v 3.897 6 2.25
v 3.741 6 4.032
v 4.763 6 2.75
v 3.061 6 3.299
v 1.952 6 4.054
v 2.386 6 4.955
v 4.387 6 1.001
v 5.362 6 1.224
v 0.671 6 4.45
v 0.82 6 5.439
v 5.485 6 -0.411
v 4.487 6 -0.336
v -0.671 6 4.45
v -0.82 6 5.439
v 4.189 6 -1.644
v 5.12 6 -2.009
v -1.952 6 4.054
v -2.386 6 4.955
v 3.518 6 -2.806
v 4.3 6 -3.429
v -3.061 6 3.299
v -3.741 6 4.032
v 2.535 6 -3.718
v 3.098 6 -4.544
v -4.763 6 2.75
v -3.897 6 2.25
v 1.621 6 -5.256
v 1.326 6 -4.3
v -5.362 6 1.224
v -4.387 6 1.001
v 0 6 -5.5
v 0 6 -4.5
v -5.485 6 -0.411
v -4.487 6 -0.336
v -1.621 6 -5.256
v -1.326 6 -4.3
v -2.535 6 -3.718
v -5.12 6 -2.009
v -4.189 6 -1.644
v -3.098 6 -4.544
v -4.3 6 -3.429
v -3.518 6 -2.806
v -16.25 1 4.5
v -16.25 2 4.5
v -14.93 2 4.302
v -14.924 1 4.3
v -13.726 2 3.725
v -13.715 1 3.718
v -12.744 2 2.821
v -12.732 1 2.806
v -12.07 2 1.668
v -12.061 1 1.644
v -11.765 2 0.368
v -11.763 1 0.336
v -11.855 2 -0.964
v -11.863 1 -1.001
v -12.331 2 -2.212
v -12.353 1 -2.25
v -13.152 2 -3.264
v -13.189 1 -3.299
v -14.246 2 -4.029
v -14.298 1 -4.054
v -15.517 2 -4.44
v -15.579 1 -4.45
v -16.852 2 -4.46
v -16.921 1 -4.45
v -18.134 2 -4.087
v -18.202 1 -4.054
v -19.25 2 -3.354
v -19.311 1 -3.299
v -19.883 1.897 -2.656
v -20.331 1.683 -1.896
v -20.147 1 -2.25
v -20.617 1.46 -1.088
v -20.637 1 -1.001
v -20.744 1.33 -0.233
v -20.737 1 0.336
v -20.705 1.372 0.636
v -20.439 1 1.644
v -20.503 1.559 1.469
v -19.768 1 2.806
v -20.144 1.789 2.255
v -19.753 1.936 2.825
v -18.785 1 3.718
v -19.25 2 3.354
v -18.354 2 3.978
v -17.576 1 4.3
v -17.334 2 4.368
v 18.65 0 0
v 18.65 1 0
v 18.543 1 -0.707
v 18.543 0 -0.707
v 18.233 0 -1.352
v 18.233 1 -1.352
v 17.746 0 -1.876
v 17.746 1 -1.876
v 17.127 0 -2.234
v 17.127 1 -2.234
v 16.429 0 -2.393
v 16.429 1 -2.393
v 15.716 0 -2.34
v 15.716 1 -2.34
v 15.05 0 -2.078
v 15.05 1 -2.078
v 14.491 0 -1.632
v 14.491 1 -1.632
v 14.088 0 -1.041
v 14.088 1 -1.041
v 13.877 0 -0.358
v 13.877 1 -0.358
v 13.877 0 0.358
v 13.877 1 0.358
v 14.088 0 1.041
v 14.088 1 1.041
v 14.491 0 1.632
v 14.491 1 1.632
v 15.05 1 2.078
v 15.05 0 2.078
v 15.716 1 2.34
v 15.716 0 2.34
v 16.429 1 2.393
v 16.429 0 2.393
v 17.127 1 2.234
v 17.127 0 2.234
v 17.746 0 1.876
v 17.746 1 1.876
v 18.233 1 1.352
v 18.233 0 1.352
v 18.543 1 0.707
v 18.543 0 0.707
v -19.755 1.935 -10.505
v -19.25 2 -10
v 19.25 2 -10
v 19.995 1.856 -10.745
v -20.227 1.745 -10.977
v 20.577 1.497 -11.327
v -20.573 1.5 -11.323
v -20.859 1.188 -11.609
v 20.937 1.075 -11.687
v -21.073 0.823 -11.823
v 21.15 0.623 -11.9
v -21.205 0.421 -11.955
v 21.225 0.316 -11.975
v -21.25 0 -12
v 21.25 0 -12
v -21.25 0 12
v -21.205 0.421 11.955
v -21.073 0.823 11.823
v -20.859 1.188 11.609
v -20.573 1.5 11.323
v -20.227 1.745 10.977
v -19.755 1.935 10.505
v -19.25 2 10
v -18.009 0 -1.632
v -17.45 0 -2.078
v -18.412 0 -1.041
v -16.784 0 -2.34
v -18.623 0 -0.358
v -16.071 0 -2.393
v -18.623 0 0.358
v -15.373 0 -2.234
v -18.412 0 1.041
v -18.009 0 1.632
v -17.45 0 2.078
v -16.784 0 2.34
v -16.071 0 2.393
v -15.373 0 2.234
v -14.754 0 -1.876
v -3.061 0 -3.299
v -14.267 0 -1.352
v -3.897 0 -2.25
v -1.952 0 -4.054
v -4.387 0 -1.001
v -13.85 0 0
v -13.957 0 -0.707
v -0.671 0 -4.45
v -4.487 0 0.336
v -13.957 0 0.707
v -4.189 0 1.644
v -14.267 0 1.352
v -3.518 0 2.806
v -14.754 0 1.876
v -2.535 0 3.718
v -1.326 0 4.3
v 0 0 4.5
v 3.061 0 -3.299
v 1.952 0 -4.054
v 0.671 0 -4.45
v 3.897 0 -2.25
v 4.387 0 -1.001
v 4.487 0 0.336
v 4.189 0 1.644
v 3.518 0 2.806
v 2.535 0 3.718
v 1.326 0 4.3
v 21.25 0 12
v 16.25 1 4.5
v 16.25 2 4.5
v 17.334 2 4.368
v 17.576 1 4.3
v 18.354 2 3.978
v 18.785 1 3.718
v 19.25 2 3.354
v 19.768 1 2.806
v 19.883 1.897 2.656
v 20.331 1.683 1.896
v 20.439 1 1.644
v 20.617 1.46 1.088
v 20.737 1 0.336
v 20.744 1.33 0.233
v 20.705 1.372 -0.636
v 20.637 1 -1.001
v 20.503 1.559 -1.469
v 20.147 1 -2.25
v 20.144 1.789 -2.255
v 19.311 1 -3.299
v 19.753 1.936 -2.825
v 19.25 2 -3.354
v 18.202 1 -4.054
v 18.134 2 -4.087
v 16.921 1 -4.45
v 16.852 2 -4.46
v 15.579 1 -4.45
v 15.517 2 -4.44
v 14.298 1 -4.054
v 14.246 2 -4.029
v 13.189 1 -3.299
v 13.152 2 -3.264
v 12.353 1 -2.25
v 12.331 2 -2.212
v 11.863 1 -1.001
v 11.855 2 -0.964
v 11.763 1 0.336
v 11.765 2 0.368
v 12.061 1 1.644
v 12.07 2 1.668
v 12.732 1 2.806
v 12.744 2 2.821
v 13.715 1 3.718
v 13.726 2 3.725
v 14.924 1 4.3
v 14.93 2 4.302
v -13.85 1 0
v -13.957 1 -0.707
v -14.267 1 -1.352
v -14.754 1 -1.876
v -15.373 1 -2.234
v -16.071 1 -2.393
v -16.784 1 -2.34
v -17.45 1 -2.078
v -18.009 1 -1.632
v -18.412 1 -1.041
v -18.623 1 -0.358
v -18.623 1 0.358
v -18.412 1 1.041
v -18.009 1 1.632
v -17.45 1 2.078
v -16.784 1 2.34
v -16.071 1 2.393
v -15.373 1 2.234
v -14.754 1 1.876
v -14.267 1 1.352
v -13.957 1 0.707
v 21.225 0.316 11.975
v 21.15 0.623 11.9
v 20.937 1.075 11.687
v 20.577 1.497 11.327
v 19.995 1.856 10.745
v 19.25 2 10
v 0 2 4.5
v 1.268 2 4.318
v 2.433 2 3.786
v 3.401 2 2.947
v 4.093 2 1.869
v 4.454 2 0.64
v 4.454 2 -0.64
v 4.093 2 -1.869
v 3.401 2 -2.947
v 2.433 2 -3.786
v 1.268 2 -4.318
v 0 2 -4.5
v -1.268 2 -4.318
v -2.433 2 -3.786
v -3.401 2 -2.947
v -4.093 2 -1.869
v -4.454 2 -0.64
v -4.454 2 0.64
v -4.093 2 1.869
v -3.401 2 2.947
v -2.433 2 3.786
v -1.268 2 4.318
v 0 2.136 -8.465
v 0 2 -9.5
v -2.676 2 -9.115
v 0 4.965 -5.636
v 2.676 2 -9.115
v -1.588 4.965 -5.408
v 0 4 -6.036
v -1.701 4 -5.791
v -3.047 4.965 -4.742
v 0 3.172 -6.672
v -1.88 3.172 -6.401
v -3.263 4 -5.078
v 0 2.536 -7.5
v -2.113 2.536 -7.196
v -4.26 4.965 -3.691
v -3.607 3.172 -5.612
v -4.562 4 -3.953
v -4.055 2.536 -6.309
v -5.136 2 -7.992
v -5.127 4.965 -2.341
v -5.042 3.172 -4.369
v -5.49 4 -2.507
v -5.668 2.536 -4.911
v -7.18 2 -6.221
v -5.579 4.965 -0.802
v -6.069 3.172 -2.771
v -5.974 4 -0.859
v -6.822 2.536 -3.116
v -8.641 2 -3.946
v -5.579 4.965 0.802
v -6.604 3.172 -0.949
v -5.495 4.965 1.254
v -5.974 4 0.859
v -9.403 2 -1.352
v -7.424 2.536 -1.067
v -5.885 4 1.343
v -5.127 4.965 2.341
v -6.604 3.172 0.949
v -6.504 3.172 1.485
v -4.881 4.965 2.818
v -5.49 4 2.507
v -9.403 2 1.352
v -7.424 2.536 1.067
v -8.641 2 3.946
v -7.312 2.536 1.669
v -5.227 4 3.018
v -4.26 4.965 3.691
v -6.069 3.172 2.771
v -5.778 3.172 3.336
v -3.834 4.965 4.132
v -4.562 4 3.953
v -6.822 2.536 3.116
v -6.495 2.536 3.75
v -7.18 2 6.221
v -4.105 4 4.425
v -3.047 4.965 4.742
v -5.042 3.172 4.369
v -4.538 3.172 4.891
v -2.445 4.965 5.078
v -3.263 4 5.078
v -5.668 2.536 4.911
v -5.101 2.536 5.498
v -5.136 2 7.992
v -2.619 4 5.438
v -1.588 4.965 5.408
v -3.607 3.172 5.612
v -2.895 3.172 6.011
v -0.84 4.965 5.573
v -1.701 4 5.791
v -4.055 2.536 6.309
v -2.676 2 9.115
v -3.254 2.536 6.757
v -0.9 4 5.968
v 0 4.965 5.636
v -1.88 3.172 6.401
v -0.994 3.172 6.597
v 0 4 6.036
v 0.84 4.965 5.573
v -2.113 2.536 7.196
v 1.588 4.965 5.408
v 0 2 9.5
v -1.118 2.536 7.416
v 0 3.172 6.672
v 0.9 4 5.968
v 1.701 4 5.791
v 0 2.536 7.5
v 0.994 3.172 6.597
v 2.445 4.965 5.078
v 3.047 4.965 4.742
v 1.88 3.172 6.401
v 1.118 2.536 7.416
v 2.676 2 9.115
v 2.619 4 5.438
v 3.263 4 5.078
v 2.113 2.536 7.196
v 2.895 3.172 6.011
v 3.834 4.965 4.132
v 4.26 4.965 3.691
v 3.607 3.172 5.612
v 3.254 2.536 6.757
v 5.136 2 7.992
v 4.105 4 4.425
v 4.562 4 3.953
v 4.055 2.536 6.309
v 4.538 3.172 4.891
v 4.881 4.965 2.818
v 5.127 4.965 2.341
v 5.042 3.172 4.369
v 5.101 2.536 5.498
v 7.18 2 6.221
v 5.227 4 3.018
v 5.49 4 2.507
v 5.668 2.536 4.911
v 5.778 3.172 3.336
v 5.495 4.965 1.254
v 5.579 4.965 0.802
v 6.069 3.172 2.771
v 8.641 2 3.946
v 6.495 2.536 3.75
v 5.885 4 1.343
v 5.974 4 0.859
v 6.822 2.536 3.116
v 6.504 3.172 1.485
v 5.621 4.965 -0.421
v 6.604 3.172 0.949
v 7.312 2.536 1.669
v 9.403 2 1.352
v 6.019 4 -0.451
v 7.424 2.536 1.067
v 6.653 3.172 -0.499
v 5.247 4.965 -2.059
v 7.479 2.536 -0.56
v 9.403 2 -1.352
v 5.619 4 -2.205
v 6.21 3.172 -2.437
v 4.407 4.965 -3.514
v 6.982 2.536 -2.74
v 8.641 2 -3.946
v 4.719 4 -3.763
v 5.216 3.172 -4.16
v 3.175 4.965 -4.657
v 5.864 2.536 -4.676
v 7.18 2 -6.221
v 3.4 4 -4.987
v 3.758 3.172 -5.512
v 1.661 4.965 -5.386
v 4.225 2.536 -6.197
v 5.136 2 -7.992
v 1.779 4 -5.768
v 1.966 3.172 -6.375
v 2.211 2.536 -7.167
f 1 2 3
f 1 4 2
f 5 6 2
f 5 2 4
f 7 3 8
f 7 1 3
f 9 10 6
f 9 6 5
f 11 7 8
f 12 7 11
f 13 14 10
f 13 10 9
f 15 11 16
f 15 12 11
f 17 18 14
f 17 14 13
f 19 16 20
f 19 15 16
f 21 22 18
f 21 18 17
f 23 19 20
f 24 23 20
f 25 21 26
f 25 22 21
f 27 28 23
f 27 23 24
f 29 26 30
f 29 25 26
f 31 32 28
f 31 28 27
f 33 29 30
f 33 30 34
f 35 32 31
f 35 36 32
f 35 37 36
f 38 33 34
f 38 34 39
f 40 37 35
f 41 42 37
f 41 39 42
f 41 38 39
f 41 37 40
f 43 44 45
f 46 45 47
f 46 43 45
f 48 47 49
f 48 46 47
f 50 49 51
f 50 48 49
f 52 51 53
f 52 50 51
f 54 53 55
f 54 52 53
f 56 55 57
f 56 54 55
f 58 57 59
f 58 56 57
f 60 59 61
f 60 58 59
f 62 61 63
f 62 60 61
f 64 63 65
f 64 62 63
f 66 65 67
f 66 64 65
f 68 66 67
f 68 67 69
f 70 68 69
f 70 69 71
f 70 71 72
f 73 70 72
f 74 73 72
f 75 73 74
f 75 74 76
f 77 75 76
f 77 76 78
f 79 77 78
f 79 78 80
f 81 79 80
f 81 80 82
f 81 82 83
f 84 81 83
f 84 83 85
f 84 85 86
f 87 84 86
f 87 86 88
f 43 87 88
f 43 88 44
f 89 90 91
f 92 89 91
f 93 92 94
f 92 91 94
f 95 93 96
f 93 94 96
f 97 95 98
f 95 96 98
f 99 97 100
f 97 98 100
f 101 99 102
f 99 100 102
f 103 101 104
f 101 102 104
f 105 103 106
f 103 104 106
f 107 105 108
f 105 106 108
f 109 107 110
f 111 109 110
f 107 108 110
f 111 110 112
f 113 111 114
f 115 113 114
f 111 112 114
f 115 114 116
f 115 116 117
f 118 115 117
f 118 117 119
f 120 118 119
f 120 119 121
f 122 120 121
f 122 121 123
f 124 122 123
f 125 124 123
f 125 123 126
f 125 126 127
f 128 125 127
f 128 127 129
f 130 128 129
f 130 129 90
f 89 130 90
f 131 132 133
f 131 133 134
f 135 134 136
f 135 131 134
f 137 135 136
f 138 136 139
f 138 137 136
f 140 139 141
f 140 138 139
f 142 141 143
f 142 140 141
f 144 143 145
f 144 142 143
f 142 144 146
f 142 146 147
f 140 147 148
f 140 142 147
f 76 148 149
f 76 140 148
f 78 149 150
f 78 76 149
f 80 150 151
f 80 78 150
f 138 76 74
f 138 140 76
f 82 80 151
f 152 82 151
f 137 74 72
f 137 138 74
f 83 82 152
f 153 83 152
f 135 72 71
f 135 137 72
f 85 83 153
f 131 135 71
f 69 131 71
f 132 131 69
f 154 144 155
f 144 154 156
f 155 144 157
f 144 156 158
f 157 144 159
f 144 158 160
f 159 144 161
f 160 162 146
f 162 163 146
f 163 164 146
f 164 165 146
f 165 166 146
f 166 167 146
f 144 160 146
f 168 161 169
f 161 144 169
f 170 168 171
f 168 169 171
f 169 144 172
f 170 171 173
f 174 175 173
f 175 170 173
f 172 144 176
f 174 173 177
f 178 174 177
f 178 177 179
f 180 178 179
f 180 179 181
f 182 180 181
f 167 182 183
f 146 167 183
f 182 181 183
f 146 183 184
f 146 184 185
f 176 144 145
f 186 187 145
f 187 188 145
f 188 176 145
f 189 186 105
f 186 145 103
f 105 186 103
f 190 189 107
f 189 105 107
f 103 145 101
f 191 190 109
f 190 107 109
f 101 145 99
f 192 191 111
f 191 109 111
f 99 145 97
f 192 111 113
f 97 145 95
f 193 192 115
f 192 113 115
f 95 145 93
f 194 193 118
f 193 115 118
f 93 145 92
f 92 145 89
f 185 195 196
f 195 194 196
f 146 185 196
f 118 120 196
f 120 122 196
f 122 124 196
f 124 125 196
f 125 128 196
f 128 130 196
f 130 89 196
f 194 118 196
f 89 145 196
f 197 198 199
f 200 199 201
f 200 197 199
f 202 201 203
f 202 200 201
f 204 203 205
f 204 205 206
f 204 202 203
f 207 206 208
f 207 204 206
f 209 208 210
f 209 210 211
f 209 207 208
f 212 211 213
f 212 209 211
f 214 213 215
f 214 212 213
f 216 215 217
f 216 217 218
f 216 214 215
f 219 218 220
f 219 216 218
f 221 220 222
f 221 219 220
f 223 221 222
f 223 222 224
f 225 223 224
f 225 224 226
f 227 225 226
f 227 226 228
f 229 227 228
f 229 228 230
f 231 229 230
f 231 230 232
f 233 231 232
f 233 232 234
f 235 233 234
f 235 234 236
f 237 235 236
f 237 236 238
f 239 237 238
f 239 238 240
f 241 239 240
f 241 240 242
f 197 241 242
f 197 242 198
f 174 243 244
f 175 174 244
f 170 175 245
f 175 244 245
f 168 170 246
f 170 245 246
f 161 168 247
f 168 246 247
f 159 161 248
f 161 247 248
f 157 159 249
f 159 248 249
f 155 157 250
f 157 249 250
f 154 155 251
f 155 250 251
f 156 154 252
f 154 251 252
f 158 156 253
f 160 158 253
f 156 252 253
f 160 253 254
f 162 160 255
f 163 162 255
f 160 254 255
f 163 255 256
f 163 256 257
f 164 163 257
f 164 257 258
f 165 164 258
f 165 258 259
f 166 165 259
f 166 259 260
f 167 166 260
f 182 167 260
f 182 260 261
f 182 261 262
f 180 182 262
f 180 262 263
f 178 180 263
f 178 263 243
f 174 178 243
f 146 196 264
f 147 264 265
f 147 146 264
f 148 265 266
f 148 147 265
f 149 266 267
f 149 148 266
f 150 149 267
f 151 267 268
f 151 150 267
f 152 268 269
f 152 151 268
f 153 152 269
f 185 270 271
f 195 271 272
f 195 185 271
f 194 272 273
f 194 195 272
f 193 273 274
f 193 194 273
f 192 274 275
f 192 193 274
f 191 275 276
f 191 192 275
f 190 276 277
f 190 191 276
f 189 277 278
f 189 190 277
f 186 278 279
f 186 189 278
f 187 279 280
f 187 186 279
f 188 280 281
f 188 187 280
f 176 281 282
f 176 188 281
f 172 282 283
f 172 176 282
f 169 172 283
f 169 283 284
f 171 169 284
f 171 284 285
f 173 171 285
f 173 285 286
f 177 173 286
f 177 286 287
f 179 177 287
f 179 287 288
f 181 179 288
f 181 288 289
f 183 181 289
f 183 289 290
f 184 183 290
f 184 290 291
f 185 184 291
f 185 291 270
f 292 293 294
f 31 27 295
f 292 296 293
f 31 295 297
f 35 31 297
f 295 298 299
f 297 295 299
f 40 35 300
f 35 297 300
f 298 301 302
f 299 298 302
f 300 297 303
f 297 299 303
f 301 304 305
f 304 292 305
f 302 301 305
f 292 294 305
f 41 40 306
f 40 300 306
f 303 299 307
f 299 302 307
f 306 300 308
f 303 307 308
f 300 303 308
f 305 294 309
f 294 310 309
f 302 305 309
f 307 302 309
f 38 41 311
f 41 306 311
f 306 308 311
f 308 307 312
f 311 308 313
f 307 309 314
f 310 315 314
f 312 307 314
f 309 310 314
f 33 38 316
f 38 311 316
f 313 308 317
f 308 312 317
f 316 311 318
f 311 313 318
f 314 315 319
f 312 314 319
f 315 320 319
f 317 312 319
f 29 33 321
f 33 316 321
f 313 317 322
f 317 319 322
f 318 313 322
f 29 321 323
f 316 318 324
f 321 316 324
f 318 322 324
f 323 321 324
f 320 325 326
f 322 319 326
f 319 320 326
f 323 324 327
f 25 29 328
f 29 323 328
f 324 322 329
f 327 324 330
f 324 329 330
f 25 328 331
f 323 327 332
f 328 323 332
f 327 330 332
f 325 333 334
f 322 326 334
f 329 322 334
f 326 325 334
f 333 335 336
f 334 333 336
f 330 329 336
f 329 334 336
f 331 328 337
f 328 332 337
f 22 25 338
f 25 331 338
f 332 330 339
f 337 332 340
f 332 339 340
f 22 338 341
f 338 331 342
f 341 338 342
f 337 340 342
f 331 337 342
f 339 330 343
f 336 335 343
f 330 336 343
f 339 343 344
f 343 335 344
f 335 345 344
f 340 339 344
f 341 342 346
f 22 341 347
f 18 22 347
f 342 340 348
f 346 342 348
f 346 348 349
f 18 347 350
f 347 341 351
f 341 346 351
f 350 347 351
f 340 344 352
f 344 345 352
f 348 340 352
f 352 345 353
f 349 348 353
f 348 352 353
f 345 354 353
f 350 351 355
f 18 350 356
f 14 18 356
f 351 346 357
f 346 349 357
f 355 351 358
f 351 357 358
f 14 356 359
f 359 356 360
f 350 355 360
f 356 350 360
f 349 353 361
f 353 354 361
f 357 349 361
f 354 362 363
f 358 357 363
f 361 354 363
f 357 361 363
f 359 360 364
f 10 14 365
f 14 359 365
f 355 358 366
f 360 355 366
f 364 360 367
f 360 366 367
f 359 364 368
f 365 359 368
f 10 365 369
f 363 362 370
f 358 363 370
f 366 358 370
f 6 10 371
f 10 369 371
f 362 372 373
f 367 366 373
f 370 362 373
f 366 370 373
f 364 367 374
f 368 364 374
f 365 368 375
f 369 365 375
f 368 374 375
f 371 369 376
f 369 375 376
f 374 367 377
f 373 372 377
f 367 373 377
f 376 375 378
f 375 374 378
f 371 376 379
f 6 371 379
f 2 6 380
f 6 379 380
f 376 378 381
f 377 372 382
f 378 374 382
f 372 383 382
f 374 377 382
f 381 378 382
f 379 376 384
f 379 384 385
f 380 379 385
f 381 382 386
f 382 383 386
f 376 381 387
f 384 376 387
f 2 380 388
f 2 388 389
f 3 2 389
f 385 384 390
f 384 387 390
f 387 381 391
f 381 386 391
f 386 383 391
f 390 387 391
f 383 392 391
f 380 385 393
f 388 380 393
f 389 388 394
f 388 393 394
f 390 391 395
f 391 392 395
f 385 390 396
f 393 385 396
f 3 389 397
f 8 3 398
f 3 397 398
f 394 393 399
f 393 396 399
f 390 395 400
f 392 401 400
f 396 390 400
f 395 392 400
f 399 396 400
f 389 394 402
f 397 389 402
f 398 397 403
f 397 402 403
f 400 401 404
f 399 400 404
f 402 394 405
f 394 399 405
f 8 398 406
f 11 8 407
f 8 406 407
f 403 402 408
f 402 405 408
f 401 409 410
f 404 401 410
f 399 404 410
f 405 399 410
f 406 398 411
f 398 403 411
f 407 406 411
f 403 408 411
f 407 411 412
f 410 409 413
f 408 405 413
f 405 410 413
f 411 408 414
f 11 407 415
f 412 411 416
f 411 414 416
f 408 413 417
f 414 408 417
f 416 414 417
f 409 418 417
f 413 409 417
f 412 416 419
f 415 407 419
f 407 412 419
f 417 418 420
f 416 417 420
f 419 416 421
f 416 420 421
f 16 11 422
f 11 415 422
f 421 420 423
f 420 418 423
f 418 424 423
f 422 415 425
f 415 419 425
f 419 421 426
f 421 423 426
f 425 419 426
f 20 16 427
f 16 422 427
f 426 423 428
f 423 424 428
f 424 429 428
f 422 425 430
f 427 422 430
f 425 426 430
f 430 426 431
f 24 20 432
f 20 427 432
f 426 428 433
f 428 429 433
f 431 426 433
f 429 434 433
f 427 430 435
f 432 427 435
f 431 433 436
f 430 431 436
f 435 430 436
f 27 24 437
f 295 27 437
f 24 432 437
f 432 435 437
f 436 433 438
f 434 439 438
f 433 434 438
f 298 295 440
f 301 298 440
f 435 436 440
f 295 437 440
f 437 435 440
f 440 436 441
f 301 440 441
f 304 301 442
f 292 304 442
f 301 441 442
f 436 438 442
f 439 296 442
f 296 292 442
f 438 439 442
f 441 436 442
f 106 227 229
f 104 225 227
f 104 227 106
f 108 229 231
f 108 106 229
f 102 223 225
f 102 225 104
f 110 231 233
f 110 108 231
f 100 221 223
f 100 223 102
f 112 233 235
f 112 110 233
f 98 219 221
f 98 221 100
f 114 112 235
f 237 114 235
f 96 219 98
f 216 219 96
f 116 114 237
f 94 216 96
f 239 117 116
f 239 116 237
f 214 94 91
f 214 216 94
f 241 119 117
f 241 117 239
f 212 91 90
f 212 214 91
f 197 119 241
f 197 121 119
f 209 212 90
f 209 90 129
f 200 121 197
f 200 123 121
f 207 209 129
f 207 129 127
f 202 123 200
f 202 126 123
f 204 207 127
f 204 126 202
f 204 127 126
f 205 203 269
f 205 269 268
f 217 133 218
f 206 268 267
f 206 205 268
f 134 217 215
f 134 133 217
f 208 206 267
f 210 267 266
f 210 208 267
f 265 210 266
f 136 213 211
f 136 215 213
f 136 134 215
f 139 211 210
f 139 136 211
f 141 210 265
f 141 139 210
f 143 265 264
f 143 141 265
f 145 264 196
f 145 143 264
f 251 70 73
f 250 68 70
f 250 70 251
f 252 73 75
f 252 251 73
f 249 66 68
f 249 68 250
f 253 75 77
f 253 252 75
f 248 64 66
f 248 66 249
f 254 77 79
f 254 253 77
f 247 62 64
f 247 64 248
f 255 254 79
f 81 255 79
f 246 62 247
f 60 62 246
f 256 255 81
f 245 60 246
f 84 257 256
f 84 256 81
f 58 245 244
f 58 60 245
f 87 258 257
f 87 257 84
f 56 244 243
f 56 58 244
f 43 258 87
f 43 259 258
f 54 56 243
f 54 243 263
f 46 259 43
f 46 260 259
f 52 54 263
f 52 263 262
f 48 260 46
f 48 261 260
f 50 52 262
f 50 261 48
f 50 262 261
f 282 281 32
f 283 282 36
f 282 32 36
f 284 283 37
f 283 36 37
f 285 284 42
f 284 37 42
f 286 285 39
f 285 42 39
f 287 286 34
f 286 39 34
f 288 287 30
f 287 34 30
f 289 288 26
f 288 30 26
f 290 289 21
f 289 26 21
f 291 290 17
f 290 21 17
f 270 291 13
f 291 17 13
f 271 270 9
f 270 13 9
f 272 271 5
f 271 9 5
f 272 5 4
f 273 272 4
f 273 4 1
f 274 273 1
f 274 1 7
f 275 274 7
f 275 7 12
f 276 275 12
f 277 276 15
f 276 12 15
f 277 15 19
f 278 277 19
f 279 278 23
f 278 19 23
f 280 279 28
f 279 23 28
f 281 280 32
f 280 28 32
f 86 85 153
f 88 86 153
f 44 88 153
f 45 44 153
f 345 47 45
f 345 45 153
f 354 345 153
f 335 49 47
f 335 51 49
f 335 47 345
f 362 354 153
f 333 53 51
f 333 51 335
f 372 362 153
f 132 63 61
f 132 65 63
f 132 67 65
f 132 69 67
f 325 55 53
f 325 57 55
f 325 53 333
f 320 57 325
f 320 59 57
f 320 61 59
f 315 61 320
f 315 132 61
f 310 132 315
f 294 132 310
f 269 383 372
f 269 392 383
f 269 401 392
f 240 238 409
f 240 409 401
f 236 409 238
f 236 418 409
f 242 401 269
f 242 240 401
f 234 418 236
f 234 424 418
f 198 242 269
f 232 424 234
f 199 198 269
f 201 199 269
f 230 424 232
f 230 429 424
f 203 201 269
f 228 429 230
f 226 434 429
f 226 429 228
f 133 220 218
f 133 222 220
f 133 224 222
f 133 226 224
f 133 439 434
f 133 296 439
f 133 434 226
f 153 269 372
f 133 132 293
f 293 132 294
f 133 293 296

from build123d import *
from build123d.topology import SkipClean

# Parameters (mm, degrees)
SKETCH1_W            = 42.5
SKETCH1_H            = 24
SKETCH1_R            = 4.5
BOSS_EXTRUDE1_DEPTH  = 2
SKETCH1_2_R          = 4.5
BOSS_EXTRUDE2_DEPTH  = 1
SKETCH2_W            = 1
SKETCH2_H            = 4
FILLET3_START        = -12
FILLET3_DEPTH        = 24
FILLET3_START_2      = -22
FILLET3_2_DEPTH      = 44
FILLET2_R            = 4
M4_CLEARANCE_HOLE1_D = 4.8


with BuildPart() as part:
    # Sketch1 → Boss-Extrude1 (new body)
    with BuildSketch(Plane(origin=(0, 0, 0), x_dir=(1, 0, 0), z_dir=(0, 1, 0))):
        Rectangle(SKETCH1_W, SKETCH1_H)
        with Locations(Location((0, 0, 0), (0, 0, 270))):
            Circle(SKETCH1_R, mode=Mode.SUBTRACT)
        with Locations(Location((16.25, 0, 0), (0, 0, 270))):
            Circle(SKETCH1_R, mode=Mode.SUBTRACT)
        with Locations(Location((-16.25, 0, 0), (0, 0, 270))):
            Circle(SKETCH1_R, mode=Mode.SUBTRACT)
    extrude(amount=BOSS_EXTRUDE1_DEPTH)

    # Sketch1<2> → Boss-Extrude2 (add)
    with BuildSketch(Plane(origin=(0, 0, 0), x_dir=(1, 0, 0), z_dir=(0, 1, 0))):
        with Locations(Location((16.25, 0, 0), (0, 0, 270))):
            Circle(SKETCH1_2_R)
        with Locations(Location((-16.25, 0, 0), (0, 0, 270))):
            Circle(SKETCH1_2_R)
    extrude(amount=BOSS_EXTRUDE2_DEPTH)

    # Sketch2 → Revolve1 (revolve)
    with SkipClean():  # the faces are left unmerged after this step: merging them gives an invalid solid
        with BuildSketch(Plane.XY, mode=Mode.PRIVATE) as revolve1_sk:
            with Locations((-5, 4)):
                Rectangle(SKETCH2_W, SKETCH2_H)
        revolve(revolve1_sk.sketch.rotate(Axis((0, 0, 0), (0, 1, 0)), 270), axis=Axis((0, 0, 0), (0, 1, 0)))
    add(part.part.scale(1), mode=Mode.REPLACE)  # the faces are merged on a copy

    # Fillet3: read off the stored shape, not the designer's step
    # Fillet3 outline → Fillet3 (cut)
    with BuildSketch(Plane.XY.offset(FILLET3_START)):
        with BuildLine():
            Line((21.25, 2), (19.25, 2))
            ThreePointArc((19.25, 2), (20.664213562, 1.414213562), (21.25, 0))
            Line((21.25, 0), (21.25, 2))
        make_face()
        with BuildLine():
            ThreePointArc((-21.25, 0), (-20.664213562, 1.414213562), (-19.25, 2))
            Line((-19.25, 2), (-21.25, 2))
            Line((-21.25, 2), (-21.25, 0))
        make_face()
    extrude(amount=FILLET3_DEPTH, mode=Mode.SUBTRACT)

    # Fillet3 2 outline → Fillet3 2 (cut)
    with BuildSketch(Plane.YZ.offset(FILLET3_START_2)):
        with BuildLine():
            Line((2, -12), (2, -10))
            ThreePointArc((2, -10), (1.414213562, -11.414213562), (0, -12))
            Line((0, -12), (2, -12))
        make_face()
        with BuildLine():
            ThreePointArc((0, 12), (1.414213562, 11.414213562), (2, 10))
            Line((2, 10), (2, 12))
            Line((2, 12), (0, 12))
        make_face()
    extrude(amount=FILLET3_2_DEPTH, mode=Mode.SUBTRACT)

    # Fillet2
    fillet2_edges = [part.edges().sort_by_distance(p)[0] for p in [
        (0, 2, 5.5),
    ]]
    fillet(fillet2_edges, radius=FILLET2_R - 0.0001)  # a hair under: the kernel refuses the full size

    # M4 Clearance Hole1 (through all)
    with Locations(Plane(origin=(0, 0, 0), x_dir=(-1, 0, 0), z_dir=(0, -1, 0))):
        with Locations((-16.25, 0), (16.25, 0)):
            Hole(M4_CLEARANCE_HOLE1_D / 2)


solid = part.part
